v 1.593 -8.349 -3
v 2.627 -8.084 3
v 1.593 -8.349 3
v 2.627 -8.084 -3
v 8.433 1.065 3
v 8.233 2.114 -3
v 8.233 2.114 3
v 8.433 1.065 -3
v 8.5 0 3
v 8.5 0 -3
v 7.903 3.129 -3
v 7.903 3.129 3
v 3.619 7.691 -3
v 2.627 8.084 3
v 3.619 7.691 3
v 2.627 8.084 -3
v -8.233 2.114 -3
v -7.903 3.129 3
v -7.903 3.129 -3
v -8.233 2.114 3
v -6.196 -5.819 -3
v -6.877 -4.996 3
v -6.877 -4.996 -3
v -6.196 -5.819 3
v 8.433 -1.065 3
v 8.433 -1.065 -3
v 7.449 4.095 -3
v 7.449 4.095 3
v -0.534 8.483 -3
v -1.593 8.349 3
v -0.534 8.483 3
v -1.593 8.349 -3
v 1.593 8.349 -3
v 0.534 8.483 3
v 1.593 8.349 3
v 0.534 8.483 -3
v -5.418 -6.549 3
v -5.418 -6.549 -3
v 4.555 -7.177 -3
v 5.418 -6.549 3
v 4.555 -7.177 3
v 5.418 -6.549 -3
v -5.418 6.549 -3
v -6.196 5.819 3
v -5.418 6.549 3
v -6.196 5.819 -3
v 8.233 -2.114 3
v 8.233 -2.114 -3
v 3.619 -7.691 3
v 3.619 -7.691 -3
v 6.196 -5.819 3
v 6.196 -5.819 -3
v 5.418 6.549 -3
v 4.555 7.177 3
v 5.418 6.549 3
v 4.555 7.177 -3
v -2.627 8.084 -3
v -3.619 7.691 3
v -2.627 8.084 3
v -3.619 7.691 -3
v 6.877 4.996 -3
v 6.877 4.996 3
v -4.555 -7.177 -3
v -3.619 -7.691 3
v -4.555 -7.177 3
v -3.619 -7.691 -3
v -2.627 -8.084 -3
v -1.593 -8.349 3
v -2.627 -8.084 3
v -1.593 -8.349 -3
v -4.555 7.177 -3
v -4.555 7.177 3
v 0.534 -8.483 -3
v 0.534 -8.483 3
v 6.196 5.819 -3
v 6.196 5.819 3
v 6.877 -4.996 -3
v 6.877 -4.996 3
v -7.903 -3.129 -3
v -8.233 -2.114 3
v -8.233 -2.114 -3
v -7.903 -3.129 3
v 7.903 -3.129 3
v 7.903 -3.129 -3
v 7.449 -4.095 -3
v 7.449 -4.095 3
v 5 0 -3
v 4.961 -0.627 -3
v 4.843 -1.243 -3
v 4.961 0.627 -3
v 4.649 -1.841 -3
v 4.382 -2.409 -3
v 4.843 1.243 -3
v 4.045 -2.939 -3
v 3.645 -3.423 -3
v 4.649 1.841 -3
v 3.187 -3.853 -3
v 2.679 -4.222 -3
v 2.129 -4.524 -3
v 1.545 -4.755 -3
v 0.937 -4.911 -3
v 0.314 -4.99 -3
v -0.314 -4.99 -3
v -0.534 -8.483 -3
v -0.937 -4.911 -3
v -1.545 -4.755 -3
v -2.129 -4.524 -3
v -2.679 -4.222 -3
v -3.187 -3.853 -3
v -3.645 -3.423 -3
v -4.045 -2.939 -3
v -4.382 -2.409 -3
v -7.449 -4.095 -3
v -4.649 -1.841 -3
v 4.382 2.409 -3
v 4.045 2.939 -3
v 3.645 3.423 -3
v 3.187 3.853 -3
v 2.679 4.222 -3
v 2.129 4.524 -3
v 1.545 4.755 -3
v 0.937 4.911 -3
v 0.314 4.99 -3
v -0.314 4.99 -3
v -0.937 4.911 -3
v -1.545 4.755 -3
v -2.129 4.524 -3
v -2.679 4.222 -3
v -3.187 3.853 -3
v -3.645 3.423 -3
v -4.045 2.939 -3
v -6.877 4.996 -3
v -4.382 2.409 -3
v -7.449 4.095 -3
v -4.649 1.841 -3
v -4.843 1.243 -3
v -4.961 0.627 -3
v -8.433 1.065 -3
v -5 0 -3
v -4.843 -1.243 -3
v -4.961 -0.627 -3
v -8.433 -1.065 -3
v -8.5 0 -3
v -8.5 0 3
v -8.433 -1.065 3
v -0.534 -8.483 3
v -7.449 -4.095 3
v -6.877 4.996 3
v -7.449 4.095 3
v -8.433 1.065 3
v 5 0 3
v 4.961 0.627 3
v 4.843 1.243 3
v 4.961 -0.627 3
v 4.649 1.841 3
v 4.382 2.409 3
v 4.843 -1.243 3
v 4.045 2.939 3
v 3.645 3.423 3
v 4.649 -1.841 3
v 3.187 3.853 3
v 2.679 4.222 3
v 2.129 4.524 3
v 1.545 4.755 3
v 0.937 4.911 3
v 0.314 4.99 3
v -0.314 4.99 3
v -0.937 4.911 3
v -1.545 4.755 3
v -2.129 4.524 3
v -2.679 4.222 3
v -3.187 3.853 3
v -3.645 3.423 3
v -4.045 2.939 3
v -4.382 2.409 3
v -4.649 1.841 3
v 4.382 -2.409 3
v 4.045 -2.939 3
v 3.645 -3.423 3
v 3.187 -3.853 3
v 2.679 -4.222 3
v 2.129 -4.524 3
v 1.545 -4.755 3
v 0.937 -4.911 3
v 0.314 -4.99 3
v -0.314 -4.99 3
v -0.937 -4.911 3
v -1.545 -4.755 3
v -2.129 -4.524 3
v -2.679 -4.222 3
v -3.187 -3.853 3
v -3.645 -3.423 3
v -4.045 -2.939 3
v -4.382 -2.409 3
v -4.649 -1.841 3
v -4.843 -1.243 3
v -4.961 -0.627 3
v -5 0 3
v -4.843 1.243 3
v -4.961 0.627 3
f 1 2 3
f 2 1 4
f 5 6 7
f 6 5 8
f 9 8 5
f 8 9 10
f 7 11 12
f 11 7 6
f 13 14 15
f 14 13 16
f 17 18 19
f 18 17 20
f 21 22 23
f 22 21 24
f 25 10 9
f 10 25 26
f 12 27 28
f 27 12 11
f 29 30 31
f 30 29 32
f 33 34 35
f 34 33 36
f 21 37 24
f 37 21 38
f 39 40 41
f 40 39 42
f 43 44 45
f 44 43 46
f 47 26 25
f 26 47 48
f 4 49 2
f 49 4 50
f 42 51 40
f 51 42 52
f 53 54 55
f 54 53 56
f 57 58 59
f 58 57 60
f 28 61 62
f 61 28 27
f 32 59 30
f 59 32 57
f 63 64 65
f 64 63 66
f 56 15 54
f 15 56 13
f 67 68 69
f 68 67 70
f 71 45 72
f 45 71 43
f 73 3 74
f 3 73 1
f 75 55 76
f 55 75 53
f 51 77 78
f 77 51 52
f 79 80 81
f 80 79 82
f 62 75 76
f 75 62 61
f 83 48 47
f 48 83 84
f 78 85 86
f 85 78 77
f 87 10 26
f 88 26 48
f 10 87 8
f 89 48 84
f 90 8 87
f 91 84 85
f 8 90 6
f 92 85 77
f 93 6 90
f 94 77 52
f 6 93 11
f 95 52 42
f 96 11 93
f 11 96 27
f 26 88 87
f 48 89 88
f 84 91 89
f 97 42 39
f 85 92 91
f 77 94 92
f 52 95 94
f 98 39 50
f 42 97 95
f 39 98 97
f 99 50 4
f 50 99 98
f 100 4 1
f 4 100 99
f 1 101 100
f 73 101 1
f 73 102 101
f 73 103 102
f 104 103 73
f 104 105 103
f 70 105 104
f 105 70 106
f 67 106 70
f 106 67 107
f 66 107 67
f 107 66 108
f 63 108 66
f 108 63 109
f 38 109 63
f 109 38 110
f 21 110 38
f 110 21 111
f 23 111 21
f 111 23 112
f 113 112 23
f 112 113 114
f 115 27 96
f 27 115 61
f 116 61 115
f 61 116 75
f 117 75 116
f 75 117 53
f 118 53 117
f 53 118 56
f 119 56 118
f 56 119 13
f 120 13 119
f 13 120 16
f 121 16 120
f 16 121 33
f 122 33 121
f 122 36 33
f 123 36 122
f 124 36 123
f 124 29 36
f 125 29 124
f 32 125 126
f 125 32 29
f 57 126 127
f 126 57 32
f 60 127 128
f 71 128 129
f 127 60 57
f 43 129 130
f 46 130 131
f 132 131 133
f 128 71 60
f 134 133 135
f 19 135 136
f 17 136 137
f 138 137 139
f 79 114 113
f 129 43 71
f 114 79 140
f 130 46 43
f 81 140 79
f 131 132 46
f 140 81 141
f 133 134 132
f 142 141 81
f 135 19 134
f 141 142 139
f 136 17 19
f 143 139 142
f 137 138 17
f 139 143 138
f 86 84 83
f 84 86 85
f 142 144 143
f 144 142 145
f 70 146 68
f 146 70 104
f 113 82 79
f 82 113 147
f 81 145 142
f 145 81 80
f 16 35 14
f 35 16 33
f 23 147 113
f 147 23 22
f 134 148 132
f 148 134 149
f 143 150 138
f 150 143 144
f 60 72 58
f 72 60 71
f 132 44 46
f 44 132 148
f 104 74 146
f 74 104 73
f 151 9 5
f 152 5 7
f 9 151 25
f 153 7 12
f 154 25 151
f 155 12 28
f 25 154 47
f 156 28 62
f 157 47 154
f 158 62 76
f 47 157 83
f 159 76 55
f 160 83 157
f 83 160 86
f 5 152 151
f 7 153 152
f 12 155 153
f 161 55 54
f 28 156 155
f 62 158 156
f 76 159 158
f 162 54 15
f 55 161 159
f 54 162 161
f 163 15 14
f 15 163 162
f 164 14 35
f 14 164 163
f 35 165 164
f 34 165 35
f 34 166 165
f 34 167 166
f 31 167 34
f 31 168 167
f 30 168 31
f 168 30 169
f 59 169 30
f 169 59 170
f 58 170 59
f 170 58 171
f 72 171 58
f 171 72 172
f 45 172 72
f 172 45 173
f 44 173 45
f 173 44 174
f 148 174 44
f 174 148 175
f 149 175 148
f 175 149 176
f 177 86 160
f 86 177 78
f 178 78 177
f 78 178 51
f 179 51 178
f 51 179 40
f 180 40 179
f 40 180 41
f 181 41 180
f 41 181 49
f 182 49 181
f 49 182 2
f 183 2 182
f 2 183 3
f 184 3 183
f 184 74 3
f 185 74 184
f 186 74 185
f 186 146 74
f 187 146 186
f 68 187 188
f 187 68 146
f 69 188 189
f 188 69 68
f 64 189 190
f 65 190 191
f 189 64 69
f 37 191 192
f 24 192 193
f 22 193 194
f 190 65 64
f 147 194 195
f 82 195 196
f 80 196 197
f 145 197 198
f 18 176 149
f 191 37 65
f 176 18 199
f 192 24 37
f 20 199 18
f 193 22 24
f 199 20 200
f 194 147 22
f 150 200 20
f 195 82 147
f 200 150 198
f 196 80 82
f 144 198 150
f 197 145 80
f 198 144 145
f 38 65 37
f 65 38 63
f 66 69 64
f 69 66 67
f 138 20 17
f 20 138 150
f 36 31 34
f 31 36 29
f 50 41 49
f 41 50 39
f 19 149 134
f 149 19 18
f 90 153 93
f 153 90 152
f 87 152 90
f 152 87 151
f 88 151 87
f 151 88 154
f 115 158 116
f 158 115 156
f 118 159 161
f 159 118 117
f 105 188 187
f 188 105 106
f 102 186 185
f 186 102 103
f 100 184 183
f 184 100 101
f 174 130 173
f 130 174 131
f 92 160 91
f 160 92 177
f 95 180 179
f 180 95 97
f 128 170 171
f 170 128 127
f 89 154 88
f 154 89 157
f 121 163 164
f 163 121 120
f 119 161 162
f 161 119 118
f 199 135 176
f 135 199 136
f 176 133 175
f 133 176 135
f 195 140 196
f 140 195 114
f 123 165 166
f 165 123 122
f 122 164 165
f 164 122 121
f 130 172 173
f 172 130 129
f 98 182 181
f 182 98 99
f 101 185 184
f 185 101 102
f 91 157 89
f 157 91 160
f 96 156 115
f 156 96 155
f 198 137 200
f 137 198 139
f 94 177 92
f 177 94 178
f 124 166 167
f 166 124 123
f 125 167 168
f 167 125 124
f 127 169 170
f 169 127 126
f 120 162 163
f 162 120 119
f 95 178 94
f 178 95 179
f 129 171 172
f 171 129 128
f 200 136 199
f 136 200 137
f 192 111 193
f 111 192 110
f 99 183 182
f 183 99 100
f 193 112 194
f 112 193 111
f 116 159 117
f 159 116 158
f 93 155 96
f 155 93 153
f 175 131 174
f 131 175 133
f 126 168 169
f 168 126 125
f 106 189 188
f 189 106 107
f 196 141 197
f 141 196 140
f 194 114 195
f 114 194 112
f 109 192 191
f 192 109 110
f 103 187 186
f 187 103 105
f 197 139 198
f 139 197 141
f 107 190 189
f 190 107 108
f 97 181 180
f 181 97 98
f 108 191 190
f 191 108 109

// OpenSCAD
$fn = 50;


difference() {
	union() {
		translate(v = [0, 0, -3.0000000000]) {
			cylinder(h = 6, r = 8.5000000000);
		}
	}
	union() {
		translate(v = [0, 0, -100.0000000000]) {
			cylinder(h = 200, r = 5.0000000000);
		}
	}
}
